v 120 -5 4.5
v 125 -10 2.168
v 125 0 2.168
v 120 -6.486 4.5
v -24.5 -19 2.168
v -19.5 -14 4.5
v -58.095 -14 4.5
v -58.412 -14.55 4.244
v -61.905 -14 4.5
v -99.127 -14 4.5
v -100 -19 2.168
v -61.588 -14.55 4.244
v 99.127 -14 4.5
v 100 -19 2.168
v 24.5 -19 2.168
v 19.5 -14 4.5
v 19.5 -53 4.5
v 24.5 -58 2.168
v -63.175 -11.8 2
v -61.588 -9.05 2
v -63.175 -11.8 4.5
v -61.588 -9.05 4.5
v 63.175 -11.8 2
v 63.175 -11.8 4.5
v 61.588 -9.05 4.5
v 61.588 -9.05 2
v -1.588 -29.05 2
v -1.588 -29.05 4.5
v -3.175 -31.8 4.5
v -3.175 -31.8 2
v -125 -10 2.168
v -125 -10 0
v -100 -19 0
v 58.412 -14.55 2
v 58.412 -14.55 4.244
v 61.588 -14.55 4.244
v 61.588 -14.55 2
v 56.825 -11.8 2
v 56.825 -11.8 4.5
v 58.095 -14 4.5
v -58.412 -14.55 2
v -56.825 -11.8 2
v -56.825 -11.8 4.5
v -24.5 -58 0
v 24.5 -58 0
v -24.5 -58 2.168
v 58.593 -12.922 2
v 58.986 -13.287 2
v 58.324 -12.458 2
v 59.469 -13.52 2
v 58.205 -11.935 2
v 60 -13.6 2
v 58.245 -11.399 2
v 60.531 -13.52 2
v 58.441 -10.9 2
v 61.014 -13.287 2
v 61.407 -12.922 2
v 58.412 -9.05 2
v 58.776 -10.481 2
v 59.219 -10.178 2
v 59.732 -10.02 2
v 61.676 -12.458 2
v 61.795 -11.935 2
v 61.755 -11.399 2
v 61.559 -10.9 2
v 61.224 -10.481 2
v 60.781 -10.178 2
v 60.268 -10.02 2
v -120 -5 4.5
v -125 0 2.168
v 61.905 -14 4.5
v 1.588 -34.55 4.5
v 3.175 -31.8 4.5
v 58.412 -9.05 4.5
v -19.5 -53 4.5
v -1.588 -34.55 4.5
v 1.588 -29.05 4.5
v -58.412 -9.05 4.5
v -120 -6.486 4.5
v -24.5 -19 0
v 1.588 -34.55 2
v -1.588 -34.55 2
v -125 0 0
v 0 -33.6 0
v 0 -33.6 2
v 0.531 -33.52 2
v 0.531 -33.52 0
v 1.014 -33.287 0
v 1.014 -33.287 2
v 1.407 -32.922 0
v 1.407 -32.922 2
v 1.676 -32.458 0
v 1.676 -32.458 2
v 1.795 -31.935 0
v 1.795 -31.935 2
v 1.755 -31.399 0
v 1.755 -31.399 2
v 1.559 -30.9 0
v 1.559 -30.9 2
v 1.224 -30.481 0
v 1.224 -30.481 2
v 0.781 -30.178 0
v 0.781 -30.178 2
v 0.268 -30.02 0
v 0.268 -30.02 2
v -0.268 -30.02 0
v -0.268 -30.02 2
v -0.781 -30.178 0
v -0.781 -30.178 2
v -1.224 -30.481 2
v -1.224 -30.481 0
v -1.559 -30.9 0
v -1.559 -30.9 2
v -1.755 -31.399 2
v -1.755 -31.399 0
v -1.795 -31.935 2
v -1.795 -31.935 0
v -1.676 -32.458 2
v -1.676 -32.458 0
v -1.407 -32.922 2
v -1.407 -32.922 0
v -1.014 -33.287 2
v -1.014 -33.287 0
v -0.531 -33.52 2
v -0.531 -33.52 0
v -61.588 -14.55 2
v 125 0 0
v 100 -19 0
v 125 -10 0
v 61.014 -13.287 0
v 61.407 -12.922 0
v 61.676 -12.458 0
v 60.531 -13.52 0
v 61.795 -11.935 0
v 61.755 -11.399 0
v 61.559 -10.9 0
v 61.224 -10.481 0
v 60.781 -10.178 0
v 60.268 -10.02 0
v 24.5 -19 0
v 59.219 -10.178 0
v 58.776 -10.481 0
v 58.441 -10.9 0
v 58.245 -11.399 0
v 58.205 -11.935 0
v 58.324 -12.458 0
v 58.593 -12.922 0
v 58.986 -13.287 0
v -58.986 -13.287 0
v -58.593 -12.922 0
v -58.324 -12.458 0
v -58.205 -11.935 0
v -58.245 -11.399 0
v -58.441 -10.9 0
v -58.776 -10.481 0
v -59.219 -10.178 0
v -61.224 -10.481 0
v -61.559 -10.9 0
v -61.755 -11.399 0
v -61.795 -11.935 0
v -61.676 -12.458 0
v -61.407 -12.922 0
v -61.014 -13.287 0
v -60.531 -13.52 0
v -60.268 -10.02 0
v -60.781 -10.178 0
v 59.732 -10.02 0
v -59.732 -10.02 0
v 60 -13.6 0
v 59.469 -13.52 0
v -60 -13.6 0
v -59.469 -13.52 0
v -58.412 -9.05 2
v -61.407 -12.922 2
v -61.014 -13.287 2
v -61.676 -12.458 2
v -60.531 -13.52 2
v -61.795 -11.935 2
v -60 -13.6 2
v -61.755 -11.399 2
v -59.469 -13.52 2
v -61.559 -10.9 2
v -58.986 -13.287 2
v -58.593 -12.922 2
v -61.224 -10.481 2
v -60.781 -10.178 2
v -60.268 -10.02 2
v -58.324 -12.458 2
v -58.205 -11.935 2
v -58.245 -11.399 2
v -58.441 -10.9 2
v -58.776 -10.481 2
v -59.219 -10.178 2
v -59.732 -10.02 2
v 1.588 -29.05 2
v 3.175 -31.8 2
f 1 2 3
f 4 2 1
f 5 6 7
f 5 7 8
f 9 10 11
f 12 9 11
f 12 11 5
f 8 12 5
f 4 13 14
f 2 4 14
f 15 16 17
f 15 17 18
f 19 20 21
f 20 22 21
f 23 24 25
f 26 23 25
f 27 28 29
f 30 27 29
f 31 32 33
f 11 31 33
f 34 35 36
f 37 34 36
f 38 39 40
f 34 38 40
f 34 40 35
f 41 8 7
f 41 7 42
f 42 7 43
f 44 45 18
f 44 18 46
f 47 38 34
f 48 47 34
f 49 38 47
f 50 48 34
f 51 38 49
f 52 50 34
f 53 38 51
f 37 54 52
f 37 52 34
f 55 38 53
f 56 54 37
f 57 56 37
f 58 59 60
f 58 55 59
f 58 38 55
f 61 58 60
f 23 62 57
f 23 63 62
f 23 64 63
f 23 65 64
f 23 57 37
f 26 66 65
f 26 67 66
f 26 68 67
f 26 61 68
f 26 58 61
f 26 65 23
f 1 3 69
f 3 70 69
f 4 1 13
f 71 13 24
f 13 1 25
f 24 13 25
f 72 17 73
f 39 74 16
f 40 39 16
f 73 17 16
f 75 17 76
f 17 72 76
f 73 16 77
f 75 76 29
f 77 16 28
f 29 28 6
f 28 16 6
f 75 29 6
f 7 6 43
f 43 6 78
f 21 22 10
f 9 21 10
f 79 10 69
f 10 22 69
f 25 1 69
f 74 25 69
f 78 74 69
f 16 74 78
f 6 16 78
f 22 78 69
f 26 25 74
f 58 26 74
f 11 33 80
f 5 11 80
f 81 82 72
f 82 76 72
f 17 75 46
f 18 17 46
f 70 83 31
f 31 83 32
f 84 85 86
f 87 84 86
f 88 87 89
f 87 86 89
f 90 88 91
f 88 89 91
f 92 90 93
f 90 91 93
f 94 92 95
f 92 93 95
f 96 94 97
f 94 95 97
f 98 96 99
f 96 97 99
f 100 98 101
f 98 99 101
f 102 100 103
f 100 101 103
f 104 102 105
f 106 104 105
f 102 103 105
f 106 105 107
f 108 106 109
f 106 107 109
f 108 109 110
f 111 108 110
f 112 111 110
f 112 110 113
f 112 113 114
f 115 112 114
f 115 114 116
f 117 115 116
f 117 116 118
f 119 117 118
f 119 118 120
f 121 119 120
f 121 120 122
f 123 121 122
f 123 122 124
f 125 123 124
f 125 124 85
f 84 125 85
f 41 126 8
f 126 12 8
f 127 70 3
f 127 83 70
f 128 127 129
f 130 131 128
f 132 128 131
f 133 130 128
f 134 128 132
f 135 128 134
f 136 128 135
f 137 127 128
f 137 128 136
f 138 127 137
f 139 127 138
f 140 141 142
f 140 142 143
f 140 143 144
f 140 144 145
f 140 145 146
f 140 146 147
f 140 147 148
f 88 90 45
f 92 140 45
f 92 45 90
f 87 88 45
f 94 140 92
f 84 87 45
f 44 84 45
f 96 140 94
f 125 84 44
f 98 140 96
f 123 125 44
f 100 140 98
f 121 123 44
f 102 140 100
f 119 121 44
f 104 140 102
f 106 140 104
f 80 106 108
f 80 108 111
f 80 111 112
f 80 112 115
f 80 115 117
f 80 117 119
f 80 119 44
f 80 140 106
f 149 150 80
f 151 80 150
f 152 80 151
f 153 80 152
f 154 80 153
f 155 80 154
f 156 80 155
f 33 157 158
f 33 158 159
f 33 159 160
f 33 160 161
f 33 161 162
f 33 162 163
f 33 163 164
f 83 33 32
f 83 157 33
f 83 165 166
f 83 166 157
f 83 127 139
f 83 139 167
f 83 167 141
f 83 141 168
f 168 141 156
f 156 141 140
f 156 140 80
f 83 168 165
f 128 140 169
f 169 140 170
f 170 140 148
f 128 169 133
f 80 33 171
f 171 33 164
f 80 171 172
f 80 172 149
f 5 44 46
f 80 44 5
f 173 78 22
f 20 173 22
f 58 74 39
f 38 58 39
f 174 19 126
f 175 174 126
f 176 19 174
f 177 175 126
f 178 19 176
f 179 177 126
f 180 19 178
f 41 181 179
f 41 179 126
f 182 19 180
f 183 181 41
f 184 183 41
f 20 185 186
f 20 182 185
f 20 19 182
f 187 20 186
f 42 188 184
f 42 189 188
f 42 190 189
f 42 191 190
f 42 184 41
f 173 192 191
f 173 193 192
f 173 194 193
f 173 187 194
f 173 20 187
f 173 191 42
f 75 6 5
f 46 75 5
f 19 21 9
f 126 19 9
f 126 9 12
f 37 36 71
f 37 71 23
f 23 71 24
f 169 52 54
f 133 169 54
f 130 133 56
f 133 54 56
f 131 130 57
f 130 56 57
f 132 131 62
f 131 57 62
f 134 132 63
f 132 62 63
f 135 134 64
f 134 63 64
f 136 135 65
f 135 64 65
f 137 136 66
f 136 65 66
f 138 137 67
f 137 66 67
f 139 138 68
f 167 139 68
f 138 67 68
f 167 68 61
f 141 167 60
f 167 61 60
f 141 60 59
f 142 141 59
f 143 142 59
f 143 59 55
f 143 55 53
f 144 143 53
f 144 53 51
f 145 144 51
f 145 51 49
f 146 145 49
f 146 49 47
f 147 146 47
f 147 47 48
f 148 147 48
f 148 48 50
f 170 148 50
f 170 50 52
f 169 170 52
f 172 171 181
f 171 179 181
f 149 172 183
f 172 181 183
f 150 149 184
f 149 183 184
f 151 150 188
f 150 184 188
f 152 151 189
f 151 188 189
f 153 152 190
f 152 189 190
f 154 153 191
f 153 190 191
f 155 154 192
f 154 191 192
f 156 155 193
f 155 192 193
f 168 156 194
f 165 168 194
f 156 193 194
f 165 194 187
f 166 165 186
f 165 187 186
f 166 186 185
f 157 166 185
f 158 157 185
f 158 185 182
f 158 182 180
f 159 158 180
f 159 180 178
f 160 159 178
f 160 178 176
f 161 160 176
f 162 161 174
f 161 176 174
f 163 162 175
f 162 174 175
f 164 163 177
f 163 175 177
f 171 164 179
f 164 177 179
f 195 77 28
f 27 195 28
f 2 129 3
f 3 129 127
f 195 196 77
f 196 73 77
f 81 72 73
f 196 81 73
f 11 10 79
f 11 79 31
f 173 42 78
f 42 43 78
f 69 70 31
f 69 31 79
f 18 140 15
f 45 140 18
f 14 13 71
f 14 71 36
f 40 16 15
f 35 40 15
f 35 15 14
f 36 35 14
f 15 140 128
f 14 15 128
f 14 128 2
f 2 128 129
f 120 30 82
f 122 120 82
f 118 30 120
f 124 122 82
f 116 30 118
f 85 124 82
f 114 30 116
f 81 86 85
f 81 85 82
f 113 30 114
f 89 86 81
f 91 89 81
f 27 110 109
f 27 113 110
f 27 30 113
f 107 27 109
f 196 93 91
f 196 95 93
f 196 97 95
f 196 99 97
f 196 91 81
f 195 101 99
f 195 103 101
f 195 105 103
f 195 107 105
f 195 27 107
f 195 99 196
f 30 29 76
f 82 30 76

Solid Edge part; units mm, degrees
sketch "Sketch1" plane through (0, 0, 0) normal (0, 0, 1) x (1, 0, 0)
  line L0 (-125, 0) -> (125, 0)
  line L1 (125, -10) -> (125, 0)
  line L2 (100, -19) -> (125, -10)
  line L3 (-100, -19) -> (100, -19)
  line L4 (-125, -10) -> (-100, -19)
  line L5 (-125, 0) -> (-125, -10)
  dimension "D1" = 250
  dimension "D2" = 10
  dimension "D3" = 10
  dimension "D4" = 19
  dimension "D5" = 200
extrude "Protrusion1" add sketch "Sketch1" along normal blind 4.5
sketch "Sketch2" plane through (0, 0, 0) normal (0, 0, 1) x (1, 0, 0)
  line L0 (-24.5, -19) -> (24.5, -19)
  line L1 (24.5, -19) -> (24.5, -58)
  line L2 (24.5, -58) -> (-24.5, -58)
  line L3 (-24.5, -58) -> (-24.5, -19)
  dimension "D1" = 49
  dimension "D2" = 39
extrude "Extrusionsausprägung_2" add sketch "Sketch2" along normal blind 4.5
hole "Bohrung_1" at (-60, -11.8, 4.5) direction (0, 0, -1) diameter 3.6 end up to next
hole "Hole1" at (60, -11.8, 4.5) direction (0, 0, -1) diameter 3.6 end up to next
hole "Hole2" at (0, -31.8, 4.5) direction (0, 0, -1) diameter 3.6 end up to next
sketch "Sketch3" plane through (0, -29, 4.5) normal (0, 0, 1) x (1, 0, 0)
  line L0 (-61.5877, 19.95) -> (-63.1754, 17.2)
  line L1 (-63.1754, 17.2) -> (-61.5877, 14.45)
  line L2 (-61.5877, 14.45) -> (-58.4123, 14.45)
  line L3 (-58.4123, 14.45) -> (-56.8246, 17.2)
  line L4 (-56.8246, 17.2) -> (-58.4123, 19.95)
  line L5 (-58.4123, 19.95) -> (-61.5877, 19.95)
  line L6 (-1.5877, -0.05) -> (-3.1754, -2.8)
  line L7 (-3.1754, -2.8) -> (-1.5877, -5.55)
  line L8 (-1.5877, -5.55) -> (1.5877, -5.55)
  line L9 (1.5877, -5.55) -> (3.1754, -2.8)
  line L10 (3.1754, -2.8) -> (1.5877, -0.05)
  line L11 (1.5877, -0.05) -> (-1.5877, -0.05)
  line L12 (58.4123, 19.95) -> (56.8246, 17.2)
  line L13 (56.8246, 17.2) -> (58.4123, 14.45)
  line L14 (58.4123, 14.45) -> (61.5877, 14.45)
  line L15 (61.5877, 14.45) -> (63.1754, 17.2)
  line L16 (63.1754, 17.2) -> (61.5877, 19.95)
  line L17 (61.5877, 19.95) -> (58.4123, 19.95)
  dimension "D1" = 5.5
  dimension "D2" = 5.5
  dimension "D3" = 5.5
extrude "Extrusionsausschnitt_1" cut sketch "Sketch3" against normal blind 2.5
chamfer "Fase_1" distance 5 angle 25 10 edges at (-62.25, -19, 4.5) (-24.5, -38.5, 4.5) (24.5, -38.5, 4.5) (0, -58, 4.5) (62.25, -19, 4.5) (112.5, -14.5, 4.5) (125, -5, 4.5) (0, 0, 4.5) (-125, -5, 4.5) (-112.5, -14.5, 4.5) measured on face at (85.8333, -9.0867, 4.5)
properties part number "54" material "Polyacticacid"
